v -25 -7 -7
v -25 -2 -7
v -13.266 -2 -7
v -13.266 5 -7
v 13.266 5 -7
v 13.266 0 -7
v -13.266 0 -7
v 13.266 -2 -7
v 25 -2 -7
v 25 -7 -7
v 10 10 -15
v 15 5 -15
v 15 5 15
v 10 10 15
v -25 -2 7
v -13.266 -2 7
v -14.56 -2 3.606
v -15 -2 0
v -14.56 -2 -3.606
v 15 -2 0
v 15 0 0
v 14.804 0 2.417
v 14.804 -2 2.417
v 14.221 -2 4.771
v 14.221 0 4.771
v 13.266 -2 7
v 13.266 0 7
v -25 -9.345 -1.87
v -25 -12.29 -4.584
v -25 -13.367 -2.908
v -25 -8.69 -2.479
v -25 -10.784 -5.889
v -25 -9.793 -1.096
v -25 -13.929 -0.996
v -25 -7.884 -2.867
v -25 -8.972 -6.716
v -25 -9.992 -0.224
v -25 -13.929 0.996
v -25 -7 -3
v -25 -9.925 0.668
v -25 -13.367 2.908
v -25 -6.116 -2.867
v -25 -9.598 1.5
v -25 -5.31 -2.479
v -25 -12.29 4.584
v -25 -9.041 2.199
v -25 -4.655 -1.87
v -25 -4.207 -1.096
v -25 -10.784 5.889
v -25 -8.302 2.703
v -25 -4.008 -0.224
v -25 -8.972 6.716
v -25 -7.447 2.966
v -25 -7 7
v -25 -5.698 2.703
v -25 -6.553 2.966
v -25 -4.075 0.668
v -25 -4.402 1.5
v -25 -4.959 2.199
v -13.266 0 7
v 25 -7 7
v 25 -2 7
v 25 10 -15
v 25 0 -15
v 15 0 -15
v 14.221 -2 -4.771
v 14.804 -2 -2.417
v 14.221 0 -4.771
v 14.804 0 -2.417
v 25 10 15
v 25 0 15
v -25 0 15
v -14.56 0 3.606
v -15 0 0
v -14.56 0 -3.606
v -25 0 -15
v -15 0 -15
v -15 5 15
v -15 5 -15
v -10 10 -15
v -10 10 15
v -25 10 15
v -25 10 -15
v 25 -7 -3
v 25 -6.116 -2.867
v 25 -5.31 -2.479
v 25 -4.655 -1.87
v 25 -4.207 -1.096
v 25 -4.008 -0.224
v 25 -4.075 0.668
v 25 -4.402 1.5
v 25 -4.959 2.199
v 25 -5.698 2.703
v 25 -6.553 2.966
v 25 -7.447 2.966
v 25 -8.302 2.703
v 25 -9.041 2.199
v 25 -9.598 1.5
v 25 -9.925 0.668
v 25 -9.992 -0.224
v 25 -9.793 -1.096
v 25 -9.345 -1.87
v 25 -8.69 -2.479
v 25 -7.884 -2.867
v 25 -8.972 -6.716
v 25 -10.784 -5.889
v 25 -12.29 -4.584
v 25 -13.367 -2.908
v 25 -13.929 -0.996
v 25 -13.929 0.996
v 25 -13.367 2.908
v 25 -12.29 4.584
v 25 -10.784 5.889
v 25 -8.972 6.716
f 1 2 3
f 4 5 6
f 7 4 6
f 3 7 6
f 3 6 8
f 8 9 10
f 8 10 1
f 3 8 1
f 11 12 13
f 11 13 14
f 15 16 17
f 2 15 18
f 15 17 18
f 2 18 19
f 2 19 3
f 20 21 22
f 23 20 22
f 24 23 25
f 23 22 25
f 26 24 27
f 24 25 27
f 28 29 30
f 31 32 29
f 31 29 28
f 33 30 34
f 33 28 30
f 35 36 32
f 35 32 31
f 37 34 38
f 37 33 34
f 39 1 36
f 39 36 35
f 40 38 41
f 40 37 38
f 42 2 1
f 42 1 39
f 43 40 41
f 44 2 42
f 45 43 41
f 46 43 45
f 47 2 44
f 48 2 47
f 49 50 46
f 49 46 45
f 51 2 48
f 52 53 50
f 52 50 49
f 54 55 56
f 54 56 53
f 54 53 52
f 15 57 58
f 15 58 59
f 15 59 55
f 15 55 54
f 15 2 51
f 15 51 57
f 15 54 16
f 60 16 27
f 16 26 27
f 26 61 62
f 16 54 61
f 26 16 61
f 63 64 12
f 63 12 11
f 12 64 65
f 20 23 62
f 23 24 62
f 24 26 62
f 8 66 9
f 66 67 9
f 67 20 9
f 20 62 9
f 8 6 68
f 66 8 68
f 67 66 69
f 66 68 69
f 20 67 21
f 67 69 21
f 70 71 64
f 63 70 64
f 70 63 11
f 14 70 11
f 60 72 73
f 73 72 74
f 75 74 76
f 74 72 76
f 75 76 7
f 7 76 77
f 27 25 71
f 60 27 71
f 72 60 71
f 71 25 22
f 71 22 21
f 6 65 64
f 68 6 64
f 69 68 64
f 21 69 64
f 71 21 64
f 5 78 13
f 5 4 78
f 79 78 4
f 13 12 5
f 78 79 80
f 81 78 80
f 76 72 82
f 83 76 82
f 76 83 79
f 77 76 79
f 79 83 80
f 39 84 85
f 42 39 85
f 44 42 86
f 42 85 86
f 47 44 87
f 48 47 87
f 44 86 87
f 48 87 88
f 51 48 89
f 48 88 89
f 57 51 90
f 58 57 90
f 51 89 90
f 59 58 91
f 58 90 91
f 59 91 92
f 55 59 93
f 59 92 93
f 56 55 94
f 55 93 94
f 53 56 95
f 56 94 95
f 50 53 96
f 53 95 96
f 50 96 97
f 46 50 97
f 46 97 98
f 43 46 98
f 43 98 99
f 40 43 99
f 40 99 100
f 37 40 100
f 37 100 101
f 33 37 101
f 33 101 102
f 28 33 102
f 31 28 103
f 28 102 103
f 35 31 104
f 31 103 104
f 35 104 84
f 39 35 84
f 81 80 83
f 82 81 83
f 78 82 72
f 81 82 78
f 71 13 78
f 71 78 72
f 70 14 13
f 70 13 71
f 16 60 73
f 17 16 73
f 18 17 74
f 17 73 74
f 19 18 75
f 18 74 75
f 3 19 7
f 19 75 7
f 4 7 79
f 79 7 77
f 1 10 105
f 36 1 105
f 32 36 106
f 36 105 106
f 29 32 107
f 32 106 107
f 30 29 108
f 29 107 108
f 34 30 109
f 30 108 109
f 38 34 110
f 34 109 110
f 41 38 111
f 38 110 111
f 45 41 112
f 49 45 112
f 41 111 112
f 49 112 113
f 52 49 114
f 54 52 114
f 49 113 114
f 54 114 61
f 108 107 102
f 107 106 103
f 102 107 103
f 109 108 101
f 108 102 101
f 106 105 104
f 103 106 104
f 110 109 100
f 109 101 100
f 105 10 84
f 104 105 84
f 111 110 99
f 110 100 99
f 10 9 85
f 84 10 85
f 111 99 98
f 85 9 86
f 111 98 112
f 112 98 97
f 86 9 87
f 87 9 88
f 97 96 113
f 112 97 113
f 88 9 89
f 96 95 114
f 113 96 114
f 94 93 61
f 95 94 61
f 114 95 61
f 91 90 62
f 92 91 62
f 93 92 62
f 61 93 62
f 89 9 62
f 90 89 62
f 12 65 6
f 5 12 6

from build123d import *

# Parameters (mm, degrees)
BOSS_EXTRUDE1_DEPTH = 5
BOSS_EXTRUDE2_DEPTH = 2
BOSS_EXTRUDE7_DEPTH = 30
SKETCH11_R          = 3
BOSS_EXTRUDE8_DEPTH = 50


with BuildPart() as part:
    # Sketch1 → Boss-Extrude1 (new body)
    with BuildSketch(Plane(origin=(0, 0, 0), x_dir=(1, 0, 0), z_dir=(0, 1, 0))):
        Polygon((-15, 15), (-25, 15), (-25, -15), (25, -15), (25, 15), (15, 15), (13.266499161, 7), (-13.266499161, 7), align=None)
    extrude(amount=BOSS_EXTRUDE1_DEPTH)

    # Sketch4 → Boss-Extrude2 (add)
    with BuildSketch(Plane.XZ):
        with BuildLine():
            Line((13.266499161, 7), (-13.266499161, 7))
            ThreePointArc((-13.266499161, 7), (-15, 0), (-13.266499161, -7))
            Line((-13.266499161, -7), (13.266499161, -7))
            ThreePointArc((13.266499161, -7), (14.560176637, -3.605725487), (15, 0))
            ThreePointArc((15, 0), (14.560176637, 3.605725487), (13.266499161, 7))
        make_face()
    extrude(amount=BOSS_EXTRUDE2_DEPTH)

    # Sketch10 → Boss-Extrude7 (add)
    with BuildSketch(Plane.XY.offset(15)):
        Polygon((-10, 10), (-25, 10), (-25, 5), (-15, 5), align=None)
        Polygon((10, 10), (15, 5), (25, 5), (25, 10), align=None)
    extrude(amount=-BOSS_EXTRUDE7_DEPTH)

    # Sketch11 → Boss-Extrude8 (add)
    with BuildSketch(Plane(origin=(25, 0, 0), x_dir=(0, 0, -1), z_dir=(1, 0, 0))):
        with BuildLine():
            Line((-7, -7), (-7, -2))
            Line((-7, -2), (7, -2))
            Line((7, -2), (7, -7))
            ThreePointArc((7, -7), (0, -14), (-7, -7))
        make_face()
        with Locations((0, -7)):
            Circle(SKETCH11_R, mode=Mode.SUBTRACT)
    extrude(amount=-BOSS_EXTRUDE8_DEPTH)


solid = part.part
